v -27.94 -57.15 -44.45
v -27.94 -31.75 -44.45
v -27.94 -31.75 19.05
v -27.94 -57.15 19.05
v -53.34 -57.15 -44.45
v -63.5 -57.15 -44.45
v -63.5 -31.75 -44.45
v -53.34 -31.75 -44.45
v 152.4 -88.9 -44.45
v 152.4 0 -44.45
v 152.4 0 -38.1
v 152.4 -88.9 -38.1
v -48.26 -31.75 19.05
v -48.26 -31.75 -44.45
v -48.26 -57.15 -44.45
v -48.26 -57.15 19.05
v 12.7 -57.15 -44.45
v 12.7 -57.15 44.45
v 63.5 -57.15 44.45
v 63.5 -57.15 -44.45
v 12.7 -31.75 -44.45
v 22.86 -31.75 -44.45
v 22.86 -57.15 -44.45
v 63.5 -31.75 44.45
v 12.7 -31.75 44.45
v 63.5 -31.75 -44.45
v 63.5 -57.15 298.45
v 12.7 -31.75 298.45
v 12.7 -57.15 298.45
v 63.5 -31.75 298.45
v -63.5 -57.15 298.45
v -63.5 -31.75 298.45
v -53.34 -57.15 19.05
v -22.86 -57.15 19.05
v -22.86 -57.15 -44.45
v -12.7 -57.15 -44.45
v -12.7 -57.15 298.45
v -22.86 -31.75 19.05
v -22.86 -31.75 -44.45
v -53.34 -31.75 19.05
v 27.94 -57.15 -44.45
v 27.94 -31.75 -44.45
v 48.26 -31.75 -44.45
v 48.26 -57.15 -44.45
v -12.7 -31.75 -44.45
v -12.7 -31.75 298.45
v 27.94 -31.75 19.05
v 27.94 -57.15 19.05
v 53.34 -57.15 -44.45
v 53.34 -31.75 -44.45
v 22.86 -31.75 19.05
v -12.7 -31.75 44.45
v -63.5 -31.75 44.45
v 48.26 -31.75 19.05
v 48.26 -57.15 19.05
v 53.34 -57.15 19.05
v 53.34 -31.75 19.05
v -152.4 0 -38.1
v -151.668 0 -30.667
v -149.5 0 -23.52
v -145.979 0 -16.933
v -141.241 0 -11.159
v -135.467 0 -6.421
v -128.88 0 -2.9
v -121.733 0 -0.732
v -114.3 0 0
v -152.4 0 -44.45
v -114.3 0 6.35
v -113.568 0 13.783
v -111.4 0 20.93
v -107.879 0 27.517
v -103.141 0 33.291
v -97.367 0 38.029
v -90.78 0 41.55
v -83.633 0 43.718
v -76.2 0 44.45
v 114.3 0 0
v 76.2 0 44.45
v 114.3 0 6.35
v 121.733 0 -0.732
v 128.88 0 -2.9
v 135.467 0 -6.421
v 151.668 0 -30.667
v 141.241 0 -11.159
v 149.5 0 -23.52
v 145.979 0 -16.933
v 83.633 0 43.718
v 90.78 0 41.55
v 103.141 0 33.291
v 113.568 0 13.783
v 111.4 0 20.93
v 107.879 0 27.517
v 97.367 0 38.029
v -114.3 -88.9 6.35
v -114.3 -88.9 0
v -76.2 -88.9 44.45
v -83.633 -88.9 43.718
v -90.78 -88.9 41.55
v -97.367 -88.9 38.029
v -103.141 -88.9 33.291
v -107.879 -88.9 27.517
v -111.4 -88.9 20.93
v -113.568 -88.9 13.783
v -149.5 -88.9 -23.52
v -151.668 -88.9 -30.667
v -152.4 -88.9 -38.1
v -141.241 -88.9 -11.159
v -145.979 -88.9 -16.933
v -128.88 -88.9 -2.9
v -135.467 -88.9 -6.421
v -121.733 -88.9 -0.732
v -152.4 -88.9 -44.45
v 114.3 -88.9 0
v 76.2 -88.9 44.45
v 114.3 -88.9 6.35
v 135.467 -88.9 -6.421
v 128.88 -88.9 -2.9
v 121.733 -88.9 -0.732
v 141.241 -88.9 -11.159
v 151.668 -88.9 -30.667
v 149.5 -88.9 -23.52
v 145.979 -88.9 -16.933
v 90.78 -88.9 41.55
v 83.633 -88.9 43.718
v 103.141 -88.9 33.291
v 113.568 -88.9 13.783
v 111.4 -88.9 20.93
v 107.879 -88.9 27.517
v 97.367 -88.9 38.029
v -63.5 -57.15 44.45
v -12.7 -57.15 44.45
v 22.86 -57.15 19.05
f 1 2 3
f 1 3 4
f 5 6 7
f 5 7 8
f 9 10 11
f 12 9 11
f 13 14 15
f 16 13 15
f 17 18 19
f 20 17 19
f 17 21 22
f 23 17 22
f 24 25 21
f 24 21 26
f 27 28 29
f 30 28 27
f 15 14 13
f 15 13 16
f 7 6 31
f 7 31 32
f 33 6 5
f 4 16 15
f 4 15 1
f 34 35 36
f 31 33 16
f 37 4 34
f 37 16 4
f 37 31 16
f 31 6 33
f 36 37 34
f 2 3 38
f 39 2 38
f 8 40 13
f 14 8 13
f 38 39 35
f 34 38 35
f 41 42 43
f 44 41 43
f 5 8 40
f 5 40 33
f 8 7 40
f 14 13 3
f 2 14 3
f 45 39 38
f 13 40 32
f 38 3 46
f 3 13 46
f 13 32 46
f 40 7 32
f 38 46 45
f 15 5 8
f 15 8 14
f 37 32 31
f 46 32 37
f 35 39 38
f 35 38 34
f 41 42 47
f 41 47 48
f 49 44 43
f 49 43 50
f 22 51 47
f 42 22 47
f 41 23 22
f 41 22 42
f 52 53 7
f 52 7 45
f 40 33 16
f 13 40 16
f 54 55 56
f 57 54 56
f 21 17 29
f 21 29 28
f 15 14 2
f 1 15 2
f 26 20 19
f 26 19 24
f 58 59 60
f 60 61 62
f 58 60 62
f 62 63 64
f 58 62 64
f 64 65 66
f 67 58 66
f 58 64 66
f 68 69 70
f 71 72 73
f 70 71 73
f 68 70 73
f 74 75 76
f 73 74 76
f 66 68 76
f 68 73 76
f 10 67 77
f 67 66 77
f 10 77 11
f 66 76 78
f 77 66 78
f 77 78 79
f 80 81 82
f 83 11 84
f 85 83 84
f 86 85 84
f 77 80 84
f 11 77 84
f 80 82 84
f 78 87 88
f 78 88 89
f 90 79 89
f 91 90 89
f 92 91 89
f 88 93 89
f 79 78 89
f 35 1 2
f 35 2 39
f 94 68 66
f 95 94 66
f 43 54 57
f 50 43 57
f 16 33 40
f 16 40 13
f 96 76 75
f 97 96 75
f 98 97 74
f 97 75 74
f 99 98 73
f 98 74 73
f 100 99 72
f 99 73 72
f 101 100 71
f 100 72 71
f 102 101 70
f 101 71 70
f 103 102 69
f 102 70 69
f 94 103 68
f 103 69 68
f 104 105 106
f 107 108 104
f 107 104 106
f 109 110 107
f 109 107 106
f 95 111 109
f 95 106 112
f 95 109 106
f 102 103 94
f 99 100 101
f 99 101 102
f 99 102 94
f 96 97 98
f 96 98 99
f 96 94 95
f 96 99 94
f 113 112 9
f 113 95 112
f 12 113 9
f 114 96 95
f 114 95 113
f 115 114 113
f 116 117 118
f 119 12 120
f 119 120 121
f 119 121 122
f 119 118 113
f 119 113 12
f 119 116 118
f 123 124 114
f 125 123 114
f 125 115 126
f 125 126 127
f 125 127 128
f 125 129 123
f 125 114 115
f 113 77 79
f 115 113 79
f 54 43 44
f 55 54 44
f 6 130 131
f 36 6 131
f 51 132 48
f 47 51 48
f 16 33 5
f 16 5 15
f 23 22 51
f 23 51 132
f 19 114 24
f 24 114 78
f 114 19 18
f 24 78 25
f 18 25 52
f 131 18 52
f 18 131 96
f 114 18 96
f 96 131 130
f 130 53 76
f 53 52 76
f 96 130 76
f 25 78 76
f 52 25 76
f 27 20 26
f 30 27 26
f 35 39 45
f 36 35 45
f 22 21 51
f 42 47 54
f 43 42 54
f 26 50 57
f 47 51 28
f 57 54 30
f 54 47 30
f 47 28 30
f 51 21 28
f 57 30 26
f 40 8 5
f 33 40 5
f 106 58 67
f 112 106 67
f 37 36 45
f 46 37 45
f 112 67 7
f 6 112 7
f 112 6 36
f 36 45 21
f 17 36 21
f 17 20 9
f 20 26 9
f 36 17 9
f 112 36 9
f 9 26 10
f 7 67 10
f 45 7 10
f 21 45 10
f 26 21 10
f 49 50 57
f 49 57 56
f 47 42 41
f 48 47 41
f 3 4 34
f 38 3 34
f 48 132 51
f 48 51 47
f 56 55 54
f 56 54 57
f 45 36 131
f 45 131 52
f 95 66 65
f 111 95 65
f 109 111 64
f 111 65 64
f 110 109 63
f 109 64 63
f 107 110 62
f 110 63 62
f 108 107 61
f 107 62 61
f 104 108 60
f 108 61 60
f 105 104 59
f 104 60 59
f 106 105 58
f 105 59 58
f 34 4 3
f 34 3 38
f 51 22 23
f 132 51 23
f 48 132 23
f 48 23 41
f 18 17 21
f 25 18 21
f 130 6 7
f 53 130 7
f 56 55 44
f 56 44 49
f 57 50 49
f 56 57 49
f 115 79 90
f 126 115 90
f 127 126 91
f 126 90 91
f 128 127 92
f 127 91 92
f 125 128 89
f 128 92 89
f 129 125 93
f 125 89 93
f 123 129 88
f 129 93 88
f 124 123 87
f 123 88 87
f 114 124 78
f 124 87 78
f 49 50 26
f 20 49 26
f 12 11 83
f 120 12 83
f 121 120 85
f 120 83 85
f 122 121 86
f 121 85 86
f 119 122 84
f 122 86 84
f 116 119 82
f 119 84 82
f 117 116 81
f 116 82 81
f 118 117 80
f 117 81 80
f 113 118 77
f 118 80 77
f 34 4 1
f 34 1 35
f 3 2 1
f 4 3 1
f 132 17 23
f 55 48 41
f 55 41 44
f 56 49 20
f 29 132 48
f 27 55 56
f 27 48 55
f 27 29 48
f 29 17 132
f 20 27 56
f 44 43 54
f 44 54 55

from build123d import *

# Parameters (mm, degrees)
F1_DEPTH      = 88.9
F2_W          = 50.8
F2_H          = 25.4
F3_DEPTH      = 88.901
F4_DEPTH      = 254
F4_DEPTH_BACK = 88.9
F5_W          = 5.08
F5_H          = 25.4
F6_DEPTH      = 63.5
F7_W          = 5.08
F7_H          = 25.4
F8_DEPTH      = 63.5
F6_FACE_W     = 5.08
F6_FACE_H     = 25.4
F9_W          = 5.08
F9_H          = 25.4
F8_FACE_W     = 5.08
F8_FACE_H     = 25.4
F10_DEPTH     = 63.5


with BuildPart() as f1:
    # F0 (on Front) → F1 (new body)
    with BuildSketch(Plane.XZ):
        with BuildLine():
            Line((-152.4, -44.45), (152.4, -44.45))
            Line((152.4, -44.45), (152.4, -38.1))
            ThreePointArc((152.4, -38.1), (141.2407683632, -11.1592316368), (114.3, 0))
            Line((114.3, 0), (114.3, 6.35))
            ThreePointArc((114.3, 6.35), (103.1407683632, 33.2907683632), (76.2, 44.45))
            Line((76.2, 44.45), (-76.2, 44.45))
            ThreePointArc((-76.2, 44.45), (-103.1407683632, 33.2907683632), (-114.3, 6.35))
            Line((-114.3, 6.35), (-114.3, 0))
            ThreePointArc((-114.3, 0), (-141.2407683632, -11.1592316368), (-152.4, -38.1))
            Line((-152.4, -38.1), (-152.4, -44.45))
        make_face()
    extrude(amount=F1_DEPTH)

    # F2 (on face) → F3 (cut, through all)
    with BuildSketch(Plane.XY.offset(44.45)):
        with Locations((-38.1, -44.45)):
            Rectangle(F2_W, F2_H)
        with Locations((38.1, -44.45)):
            Rectangle(F2_W, F2_H)
    extrude(amount=-F3_DEPTH, mode=Mode.SUBTRACT)


with BuildPart() as f4:
    # F2 (on face) → F4 (new body, two sides)
    with BuildSketch(Plane.XY.offset(44.45)) as f4_sk:
        with Locations((-38.1, -44.45)):
            Rectangle(F2_W, F2_H)
    extrude(amount=F4_DEPTH)
    extrude(f4_sk.sketch, amount=-F4_DEPTH_BACK)

    # F5 (on face) → F6 (cut)
    with BuildSketch(Plane(origin=(0, 0, -44.45), x_dir=(1, 0, 0), z_dir=(0, 0, -1))):
        with Locations((-50.8, 44.45)):
            Rectangle(F5_W, F5_H)
        with Locations((-25.4, 44.45)):
            Rectangle(F5_W, F5_H)
    extrude(amount=-F6_DEPTH, mode=Mode.SUBTRACT)


with BuildPart() as f4b:
    # F2 (on face) → F4, piece 2 (new body, two sides)
    with BuildSketch(Plane.XY.offset(44.45)) as f4_2_sk:
        with Locations((38.1, -44.45)):
            Rectangle(F2_W, F2_H)
    extrude(amount=F4_DEPTH)
    extrude(f4_2_sk.sketch, amount=-F4_DEPTH_BACK)

    # F7 (on face) → F8 (cut)
    with BuildSketch(Plane(origin=(0, 0, -44.45), x_dir=(1, 0, 0), z_dir=(0, 0, -1))):
        with Locations((25.4, 44.45)):
            Rectangle(F7_W, F7_H)
        with Locations((50.8, 44.45)):
            Rectangle(F7_W, F7_H)
    extrude(amount=-F8_DEPTH, mode=Mode.SUBTRACT)


with BuildPart() as f10:
    # F6_face (on face) + F9 (on face) + F8_face (on face) → F10 (new body)
    with BuildSketch(Plane(origin=(-50.8, -44.45, 19.05), x_dir=(1, 0, 0), z_dir=(0, 0, -1))):
        with Locations((25.4, 0)):
            Rectangle(F6_FACE_W, F6_FACE_H)
    with BuildSketch(Plane(origin=(0, 0, 19.05), x_dir=(1, 0, 0), z_dir=(0, 0, -1))):
        with Locations((-50.8, 44.45)):
            Rectangle(F9_W, F9_H)
    with BuildSketch(Plane(origin=(25.4, -44.45, 19.05), x_dir=(1, 0, 0), z_dir=(0, 0, -1))):
        Rectangle(F8_FACE_W, F8_FACE_H)
        with Locations((25.4, 0)):
            Rectangle(F8_FACE_W, F8_FACE_H)
    extrude(amount=F10_DEPTH)


solid = Compound([f1.part, f4.part, f4b.part, f10.part])
